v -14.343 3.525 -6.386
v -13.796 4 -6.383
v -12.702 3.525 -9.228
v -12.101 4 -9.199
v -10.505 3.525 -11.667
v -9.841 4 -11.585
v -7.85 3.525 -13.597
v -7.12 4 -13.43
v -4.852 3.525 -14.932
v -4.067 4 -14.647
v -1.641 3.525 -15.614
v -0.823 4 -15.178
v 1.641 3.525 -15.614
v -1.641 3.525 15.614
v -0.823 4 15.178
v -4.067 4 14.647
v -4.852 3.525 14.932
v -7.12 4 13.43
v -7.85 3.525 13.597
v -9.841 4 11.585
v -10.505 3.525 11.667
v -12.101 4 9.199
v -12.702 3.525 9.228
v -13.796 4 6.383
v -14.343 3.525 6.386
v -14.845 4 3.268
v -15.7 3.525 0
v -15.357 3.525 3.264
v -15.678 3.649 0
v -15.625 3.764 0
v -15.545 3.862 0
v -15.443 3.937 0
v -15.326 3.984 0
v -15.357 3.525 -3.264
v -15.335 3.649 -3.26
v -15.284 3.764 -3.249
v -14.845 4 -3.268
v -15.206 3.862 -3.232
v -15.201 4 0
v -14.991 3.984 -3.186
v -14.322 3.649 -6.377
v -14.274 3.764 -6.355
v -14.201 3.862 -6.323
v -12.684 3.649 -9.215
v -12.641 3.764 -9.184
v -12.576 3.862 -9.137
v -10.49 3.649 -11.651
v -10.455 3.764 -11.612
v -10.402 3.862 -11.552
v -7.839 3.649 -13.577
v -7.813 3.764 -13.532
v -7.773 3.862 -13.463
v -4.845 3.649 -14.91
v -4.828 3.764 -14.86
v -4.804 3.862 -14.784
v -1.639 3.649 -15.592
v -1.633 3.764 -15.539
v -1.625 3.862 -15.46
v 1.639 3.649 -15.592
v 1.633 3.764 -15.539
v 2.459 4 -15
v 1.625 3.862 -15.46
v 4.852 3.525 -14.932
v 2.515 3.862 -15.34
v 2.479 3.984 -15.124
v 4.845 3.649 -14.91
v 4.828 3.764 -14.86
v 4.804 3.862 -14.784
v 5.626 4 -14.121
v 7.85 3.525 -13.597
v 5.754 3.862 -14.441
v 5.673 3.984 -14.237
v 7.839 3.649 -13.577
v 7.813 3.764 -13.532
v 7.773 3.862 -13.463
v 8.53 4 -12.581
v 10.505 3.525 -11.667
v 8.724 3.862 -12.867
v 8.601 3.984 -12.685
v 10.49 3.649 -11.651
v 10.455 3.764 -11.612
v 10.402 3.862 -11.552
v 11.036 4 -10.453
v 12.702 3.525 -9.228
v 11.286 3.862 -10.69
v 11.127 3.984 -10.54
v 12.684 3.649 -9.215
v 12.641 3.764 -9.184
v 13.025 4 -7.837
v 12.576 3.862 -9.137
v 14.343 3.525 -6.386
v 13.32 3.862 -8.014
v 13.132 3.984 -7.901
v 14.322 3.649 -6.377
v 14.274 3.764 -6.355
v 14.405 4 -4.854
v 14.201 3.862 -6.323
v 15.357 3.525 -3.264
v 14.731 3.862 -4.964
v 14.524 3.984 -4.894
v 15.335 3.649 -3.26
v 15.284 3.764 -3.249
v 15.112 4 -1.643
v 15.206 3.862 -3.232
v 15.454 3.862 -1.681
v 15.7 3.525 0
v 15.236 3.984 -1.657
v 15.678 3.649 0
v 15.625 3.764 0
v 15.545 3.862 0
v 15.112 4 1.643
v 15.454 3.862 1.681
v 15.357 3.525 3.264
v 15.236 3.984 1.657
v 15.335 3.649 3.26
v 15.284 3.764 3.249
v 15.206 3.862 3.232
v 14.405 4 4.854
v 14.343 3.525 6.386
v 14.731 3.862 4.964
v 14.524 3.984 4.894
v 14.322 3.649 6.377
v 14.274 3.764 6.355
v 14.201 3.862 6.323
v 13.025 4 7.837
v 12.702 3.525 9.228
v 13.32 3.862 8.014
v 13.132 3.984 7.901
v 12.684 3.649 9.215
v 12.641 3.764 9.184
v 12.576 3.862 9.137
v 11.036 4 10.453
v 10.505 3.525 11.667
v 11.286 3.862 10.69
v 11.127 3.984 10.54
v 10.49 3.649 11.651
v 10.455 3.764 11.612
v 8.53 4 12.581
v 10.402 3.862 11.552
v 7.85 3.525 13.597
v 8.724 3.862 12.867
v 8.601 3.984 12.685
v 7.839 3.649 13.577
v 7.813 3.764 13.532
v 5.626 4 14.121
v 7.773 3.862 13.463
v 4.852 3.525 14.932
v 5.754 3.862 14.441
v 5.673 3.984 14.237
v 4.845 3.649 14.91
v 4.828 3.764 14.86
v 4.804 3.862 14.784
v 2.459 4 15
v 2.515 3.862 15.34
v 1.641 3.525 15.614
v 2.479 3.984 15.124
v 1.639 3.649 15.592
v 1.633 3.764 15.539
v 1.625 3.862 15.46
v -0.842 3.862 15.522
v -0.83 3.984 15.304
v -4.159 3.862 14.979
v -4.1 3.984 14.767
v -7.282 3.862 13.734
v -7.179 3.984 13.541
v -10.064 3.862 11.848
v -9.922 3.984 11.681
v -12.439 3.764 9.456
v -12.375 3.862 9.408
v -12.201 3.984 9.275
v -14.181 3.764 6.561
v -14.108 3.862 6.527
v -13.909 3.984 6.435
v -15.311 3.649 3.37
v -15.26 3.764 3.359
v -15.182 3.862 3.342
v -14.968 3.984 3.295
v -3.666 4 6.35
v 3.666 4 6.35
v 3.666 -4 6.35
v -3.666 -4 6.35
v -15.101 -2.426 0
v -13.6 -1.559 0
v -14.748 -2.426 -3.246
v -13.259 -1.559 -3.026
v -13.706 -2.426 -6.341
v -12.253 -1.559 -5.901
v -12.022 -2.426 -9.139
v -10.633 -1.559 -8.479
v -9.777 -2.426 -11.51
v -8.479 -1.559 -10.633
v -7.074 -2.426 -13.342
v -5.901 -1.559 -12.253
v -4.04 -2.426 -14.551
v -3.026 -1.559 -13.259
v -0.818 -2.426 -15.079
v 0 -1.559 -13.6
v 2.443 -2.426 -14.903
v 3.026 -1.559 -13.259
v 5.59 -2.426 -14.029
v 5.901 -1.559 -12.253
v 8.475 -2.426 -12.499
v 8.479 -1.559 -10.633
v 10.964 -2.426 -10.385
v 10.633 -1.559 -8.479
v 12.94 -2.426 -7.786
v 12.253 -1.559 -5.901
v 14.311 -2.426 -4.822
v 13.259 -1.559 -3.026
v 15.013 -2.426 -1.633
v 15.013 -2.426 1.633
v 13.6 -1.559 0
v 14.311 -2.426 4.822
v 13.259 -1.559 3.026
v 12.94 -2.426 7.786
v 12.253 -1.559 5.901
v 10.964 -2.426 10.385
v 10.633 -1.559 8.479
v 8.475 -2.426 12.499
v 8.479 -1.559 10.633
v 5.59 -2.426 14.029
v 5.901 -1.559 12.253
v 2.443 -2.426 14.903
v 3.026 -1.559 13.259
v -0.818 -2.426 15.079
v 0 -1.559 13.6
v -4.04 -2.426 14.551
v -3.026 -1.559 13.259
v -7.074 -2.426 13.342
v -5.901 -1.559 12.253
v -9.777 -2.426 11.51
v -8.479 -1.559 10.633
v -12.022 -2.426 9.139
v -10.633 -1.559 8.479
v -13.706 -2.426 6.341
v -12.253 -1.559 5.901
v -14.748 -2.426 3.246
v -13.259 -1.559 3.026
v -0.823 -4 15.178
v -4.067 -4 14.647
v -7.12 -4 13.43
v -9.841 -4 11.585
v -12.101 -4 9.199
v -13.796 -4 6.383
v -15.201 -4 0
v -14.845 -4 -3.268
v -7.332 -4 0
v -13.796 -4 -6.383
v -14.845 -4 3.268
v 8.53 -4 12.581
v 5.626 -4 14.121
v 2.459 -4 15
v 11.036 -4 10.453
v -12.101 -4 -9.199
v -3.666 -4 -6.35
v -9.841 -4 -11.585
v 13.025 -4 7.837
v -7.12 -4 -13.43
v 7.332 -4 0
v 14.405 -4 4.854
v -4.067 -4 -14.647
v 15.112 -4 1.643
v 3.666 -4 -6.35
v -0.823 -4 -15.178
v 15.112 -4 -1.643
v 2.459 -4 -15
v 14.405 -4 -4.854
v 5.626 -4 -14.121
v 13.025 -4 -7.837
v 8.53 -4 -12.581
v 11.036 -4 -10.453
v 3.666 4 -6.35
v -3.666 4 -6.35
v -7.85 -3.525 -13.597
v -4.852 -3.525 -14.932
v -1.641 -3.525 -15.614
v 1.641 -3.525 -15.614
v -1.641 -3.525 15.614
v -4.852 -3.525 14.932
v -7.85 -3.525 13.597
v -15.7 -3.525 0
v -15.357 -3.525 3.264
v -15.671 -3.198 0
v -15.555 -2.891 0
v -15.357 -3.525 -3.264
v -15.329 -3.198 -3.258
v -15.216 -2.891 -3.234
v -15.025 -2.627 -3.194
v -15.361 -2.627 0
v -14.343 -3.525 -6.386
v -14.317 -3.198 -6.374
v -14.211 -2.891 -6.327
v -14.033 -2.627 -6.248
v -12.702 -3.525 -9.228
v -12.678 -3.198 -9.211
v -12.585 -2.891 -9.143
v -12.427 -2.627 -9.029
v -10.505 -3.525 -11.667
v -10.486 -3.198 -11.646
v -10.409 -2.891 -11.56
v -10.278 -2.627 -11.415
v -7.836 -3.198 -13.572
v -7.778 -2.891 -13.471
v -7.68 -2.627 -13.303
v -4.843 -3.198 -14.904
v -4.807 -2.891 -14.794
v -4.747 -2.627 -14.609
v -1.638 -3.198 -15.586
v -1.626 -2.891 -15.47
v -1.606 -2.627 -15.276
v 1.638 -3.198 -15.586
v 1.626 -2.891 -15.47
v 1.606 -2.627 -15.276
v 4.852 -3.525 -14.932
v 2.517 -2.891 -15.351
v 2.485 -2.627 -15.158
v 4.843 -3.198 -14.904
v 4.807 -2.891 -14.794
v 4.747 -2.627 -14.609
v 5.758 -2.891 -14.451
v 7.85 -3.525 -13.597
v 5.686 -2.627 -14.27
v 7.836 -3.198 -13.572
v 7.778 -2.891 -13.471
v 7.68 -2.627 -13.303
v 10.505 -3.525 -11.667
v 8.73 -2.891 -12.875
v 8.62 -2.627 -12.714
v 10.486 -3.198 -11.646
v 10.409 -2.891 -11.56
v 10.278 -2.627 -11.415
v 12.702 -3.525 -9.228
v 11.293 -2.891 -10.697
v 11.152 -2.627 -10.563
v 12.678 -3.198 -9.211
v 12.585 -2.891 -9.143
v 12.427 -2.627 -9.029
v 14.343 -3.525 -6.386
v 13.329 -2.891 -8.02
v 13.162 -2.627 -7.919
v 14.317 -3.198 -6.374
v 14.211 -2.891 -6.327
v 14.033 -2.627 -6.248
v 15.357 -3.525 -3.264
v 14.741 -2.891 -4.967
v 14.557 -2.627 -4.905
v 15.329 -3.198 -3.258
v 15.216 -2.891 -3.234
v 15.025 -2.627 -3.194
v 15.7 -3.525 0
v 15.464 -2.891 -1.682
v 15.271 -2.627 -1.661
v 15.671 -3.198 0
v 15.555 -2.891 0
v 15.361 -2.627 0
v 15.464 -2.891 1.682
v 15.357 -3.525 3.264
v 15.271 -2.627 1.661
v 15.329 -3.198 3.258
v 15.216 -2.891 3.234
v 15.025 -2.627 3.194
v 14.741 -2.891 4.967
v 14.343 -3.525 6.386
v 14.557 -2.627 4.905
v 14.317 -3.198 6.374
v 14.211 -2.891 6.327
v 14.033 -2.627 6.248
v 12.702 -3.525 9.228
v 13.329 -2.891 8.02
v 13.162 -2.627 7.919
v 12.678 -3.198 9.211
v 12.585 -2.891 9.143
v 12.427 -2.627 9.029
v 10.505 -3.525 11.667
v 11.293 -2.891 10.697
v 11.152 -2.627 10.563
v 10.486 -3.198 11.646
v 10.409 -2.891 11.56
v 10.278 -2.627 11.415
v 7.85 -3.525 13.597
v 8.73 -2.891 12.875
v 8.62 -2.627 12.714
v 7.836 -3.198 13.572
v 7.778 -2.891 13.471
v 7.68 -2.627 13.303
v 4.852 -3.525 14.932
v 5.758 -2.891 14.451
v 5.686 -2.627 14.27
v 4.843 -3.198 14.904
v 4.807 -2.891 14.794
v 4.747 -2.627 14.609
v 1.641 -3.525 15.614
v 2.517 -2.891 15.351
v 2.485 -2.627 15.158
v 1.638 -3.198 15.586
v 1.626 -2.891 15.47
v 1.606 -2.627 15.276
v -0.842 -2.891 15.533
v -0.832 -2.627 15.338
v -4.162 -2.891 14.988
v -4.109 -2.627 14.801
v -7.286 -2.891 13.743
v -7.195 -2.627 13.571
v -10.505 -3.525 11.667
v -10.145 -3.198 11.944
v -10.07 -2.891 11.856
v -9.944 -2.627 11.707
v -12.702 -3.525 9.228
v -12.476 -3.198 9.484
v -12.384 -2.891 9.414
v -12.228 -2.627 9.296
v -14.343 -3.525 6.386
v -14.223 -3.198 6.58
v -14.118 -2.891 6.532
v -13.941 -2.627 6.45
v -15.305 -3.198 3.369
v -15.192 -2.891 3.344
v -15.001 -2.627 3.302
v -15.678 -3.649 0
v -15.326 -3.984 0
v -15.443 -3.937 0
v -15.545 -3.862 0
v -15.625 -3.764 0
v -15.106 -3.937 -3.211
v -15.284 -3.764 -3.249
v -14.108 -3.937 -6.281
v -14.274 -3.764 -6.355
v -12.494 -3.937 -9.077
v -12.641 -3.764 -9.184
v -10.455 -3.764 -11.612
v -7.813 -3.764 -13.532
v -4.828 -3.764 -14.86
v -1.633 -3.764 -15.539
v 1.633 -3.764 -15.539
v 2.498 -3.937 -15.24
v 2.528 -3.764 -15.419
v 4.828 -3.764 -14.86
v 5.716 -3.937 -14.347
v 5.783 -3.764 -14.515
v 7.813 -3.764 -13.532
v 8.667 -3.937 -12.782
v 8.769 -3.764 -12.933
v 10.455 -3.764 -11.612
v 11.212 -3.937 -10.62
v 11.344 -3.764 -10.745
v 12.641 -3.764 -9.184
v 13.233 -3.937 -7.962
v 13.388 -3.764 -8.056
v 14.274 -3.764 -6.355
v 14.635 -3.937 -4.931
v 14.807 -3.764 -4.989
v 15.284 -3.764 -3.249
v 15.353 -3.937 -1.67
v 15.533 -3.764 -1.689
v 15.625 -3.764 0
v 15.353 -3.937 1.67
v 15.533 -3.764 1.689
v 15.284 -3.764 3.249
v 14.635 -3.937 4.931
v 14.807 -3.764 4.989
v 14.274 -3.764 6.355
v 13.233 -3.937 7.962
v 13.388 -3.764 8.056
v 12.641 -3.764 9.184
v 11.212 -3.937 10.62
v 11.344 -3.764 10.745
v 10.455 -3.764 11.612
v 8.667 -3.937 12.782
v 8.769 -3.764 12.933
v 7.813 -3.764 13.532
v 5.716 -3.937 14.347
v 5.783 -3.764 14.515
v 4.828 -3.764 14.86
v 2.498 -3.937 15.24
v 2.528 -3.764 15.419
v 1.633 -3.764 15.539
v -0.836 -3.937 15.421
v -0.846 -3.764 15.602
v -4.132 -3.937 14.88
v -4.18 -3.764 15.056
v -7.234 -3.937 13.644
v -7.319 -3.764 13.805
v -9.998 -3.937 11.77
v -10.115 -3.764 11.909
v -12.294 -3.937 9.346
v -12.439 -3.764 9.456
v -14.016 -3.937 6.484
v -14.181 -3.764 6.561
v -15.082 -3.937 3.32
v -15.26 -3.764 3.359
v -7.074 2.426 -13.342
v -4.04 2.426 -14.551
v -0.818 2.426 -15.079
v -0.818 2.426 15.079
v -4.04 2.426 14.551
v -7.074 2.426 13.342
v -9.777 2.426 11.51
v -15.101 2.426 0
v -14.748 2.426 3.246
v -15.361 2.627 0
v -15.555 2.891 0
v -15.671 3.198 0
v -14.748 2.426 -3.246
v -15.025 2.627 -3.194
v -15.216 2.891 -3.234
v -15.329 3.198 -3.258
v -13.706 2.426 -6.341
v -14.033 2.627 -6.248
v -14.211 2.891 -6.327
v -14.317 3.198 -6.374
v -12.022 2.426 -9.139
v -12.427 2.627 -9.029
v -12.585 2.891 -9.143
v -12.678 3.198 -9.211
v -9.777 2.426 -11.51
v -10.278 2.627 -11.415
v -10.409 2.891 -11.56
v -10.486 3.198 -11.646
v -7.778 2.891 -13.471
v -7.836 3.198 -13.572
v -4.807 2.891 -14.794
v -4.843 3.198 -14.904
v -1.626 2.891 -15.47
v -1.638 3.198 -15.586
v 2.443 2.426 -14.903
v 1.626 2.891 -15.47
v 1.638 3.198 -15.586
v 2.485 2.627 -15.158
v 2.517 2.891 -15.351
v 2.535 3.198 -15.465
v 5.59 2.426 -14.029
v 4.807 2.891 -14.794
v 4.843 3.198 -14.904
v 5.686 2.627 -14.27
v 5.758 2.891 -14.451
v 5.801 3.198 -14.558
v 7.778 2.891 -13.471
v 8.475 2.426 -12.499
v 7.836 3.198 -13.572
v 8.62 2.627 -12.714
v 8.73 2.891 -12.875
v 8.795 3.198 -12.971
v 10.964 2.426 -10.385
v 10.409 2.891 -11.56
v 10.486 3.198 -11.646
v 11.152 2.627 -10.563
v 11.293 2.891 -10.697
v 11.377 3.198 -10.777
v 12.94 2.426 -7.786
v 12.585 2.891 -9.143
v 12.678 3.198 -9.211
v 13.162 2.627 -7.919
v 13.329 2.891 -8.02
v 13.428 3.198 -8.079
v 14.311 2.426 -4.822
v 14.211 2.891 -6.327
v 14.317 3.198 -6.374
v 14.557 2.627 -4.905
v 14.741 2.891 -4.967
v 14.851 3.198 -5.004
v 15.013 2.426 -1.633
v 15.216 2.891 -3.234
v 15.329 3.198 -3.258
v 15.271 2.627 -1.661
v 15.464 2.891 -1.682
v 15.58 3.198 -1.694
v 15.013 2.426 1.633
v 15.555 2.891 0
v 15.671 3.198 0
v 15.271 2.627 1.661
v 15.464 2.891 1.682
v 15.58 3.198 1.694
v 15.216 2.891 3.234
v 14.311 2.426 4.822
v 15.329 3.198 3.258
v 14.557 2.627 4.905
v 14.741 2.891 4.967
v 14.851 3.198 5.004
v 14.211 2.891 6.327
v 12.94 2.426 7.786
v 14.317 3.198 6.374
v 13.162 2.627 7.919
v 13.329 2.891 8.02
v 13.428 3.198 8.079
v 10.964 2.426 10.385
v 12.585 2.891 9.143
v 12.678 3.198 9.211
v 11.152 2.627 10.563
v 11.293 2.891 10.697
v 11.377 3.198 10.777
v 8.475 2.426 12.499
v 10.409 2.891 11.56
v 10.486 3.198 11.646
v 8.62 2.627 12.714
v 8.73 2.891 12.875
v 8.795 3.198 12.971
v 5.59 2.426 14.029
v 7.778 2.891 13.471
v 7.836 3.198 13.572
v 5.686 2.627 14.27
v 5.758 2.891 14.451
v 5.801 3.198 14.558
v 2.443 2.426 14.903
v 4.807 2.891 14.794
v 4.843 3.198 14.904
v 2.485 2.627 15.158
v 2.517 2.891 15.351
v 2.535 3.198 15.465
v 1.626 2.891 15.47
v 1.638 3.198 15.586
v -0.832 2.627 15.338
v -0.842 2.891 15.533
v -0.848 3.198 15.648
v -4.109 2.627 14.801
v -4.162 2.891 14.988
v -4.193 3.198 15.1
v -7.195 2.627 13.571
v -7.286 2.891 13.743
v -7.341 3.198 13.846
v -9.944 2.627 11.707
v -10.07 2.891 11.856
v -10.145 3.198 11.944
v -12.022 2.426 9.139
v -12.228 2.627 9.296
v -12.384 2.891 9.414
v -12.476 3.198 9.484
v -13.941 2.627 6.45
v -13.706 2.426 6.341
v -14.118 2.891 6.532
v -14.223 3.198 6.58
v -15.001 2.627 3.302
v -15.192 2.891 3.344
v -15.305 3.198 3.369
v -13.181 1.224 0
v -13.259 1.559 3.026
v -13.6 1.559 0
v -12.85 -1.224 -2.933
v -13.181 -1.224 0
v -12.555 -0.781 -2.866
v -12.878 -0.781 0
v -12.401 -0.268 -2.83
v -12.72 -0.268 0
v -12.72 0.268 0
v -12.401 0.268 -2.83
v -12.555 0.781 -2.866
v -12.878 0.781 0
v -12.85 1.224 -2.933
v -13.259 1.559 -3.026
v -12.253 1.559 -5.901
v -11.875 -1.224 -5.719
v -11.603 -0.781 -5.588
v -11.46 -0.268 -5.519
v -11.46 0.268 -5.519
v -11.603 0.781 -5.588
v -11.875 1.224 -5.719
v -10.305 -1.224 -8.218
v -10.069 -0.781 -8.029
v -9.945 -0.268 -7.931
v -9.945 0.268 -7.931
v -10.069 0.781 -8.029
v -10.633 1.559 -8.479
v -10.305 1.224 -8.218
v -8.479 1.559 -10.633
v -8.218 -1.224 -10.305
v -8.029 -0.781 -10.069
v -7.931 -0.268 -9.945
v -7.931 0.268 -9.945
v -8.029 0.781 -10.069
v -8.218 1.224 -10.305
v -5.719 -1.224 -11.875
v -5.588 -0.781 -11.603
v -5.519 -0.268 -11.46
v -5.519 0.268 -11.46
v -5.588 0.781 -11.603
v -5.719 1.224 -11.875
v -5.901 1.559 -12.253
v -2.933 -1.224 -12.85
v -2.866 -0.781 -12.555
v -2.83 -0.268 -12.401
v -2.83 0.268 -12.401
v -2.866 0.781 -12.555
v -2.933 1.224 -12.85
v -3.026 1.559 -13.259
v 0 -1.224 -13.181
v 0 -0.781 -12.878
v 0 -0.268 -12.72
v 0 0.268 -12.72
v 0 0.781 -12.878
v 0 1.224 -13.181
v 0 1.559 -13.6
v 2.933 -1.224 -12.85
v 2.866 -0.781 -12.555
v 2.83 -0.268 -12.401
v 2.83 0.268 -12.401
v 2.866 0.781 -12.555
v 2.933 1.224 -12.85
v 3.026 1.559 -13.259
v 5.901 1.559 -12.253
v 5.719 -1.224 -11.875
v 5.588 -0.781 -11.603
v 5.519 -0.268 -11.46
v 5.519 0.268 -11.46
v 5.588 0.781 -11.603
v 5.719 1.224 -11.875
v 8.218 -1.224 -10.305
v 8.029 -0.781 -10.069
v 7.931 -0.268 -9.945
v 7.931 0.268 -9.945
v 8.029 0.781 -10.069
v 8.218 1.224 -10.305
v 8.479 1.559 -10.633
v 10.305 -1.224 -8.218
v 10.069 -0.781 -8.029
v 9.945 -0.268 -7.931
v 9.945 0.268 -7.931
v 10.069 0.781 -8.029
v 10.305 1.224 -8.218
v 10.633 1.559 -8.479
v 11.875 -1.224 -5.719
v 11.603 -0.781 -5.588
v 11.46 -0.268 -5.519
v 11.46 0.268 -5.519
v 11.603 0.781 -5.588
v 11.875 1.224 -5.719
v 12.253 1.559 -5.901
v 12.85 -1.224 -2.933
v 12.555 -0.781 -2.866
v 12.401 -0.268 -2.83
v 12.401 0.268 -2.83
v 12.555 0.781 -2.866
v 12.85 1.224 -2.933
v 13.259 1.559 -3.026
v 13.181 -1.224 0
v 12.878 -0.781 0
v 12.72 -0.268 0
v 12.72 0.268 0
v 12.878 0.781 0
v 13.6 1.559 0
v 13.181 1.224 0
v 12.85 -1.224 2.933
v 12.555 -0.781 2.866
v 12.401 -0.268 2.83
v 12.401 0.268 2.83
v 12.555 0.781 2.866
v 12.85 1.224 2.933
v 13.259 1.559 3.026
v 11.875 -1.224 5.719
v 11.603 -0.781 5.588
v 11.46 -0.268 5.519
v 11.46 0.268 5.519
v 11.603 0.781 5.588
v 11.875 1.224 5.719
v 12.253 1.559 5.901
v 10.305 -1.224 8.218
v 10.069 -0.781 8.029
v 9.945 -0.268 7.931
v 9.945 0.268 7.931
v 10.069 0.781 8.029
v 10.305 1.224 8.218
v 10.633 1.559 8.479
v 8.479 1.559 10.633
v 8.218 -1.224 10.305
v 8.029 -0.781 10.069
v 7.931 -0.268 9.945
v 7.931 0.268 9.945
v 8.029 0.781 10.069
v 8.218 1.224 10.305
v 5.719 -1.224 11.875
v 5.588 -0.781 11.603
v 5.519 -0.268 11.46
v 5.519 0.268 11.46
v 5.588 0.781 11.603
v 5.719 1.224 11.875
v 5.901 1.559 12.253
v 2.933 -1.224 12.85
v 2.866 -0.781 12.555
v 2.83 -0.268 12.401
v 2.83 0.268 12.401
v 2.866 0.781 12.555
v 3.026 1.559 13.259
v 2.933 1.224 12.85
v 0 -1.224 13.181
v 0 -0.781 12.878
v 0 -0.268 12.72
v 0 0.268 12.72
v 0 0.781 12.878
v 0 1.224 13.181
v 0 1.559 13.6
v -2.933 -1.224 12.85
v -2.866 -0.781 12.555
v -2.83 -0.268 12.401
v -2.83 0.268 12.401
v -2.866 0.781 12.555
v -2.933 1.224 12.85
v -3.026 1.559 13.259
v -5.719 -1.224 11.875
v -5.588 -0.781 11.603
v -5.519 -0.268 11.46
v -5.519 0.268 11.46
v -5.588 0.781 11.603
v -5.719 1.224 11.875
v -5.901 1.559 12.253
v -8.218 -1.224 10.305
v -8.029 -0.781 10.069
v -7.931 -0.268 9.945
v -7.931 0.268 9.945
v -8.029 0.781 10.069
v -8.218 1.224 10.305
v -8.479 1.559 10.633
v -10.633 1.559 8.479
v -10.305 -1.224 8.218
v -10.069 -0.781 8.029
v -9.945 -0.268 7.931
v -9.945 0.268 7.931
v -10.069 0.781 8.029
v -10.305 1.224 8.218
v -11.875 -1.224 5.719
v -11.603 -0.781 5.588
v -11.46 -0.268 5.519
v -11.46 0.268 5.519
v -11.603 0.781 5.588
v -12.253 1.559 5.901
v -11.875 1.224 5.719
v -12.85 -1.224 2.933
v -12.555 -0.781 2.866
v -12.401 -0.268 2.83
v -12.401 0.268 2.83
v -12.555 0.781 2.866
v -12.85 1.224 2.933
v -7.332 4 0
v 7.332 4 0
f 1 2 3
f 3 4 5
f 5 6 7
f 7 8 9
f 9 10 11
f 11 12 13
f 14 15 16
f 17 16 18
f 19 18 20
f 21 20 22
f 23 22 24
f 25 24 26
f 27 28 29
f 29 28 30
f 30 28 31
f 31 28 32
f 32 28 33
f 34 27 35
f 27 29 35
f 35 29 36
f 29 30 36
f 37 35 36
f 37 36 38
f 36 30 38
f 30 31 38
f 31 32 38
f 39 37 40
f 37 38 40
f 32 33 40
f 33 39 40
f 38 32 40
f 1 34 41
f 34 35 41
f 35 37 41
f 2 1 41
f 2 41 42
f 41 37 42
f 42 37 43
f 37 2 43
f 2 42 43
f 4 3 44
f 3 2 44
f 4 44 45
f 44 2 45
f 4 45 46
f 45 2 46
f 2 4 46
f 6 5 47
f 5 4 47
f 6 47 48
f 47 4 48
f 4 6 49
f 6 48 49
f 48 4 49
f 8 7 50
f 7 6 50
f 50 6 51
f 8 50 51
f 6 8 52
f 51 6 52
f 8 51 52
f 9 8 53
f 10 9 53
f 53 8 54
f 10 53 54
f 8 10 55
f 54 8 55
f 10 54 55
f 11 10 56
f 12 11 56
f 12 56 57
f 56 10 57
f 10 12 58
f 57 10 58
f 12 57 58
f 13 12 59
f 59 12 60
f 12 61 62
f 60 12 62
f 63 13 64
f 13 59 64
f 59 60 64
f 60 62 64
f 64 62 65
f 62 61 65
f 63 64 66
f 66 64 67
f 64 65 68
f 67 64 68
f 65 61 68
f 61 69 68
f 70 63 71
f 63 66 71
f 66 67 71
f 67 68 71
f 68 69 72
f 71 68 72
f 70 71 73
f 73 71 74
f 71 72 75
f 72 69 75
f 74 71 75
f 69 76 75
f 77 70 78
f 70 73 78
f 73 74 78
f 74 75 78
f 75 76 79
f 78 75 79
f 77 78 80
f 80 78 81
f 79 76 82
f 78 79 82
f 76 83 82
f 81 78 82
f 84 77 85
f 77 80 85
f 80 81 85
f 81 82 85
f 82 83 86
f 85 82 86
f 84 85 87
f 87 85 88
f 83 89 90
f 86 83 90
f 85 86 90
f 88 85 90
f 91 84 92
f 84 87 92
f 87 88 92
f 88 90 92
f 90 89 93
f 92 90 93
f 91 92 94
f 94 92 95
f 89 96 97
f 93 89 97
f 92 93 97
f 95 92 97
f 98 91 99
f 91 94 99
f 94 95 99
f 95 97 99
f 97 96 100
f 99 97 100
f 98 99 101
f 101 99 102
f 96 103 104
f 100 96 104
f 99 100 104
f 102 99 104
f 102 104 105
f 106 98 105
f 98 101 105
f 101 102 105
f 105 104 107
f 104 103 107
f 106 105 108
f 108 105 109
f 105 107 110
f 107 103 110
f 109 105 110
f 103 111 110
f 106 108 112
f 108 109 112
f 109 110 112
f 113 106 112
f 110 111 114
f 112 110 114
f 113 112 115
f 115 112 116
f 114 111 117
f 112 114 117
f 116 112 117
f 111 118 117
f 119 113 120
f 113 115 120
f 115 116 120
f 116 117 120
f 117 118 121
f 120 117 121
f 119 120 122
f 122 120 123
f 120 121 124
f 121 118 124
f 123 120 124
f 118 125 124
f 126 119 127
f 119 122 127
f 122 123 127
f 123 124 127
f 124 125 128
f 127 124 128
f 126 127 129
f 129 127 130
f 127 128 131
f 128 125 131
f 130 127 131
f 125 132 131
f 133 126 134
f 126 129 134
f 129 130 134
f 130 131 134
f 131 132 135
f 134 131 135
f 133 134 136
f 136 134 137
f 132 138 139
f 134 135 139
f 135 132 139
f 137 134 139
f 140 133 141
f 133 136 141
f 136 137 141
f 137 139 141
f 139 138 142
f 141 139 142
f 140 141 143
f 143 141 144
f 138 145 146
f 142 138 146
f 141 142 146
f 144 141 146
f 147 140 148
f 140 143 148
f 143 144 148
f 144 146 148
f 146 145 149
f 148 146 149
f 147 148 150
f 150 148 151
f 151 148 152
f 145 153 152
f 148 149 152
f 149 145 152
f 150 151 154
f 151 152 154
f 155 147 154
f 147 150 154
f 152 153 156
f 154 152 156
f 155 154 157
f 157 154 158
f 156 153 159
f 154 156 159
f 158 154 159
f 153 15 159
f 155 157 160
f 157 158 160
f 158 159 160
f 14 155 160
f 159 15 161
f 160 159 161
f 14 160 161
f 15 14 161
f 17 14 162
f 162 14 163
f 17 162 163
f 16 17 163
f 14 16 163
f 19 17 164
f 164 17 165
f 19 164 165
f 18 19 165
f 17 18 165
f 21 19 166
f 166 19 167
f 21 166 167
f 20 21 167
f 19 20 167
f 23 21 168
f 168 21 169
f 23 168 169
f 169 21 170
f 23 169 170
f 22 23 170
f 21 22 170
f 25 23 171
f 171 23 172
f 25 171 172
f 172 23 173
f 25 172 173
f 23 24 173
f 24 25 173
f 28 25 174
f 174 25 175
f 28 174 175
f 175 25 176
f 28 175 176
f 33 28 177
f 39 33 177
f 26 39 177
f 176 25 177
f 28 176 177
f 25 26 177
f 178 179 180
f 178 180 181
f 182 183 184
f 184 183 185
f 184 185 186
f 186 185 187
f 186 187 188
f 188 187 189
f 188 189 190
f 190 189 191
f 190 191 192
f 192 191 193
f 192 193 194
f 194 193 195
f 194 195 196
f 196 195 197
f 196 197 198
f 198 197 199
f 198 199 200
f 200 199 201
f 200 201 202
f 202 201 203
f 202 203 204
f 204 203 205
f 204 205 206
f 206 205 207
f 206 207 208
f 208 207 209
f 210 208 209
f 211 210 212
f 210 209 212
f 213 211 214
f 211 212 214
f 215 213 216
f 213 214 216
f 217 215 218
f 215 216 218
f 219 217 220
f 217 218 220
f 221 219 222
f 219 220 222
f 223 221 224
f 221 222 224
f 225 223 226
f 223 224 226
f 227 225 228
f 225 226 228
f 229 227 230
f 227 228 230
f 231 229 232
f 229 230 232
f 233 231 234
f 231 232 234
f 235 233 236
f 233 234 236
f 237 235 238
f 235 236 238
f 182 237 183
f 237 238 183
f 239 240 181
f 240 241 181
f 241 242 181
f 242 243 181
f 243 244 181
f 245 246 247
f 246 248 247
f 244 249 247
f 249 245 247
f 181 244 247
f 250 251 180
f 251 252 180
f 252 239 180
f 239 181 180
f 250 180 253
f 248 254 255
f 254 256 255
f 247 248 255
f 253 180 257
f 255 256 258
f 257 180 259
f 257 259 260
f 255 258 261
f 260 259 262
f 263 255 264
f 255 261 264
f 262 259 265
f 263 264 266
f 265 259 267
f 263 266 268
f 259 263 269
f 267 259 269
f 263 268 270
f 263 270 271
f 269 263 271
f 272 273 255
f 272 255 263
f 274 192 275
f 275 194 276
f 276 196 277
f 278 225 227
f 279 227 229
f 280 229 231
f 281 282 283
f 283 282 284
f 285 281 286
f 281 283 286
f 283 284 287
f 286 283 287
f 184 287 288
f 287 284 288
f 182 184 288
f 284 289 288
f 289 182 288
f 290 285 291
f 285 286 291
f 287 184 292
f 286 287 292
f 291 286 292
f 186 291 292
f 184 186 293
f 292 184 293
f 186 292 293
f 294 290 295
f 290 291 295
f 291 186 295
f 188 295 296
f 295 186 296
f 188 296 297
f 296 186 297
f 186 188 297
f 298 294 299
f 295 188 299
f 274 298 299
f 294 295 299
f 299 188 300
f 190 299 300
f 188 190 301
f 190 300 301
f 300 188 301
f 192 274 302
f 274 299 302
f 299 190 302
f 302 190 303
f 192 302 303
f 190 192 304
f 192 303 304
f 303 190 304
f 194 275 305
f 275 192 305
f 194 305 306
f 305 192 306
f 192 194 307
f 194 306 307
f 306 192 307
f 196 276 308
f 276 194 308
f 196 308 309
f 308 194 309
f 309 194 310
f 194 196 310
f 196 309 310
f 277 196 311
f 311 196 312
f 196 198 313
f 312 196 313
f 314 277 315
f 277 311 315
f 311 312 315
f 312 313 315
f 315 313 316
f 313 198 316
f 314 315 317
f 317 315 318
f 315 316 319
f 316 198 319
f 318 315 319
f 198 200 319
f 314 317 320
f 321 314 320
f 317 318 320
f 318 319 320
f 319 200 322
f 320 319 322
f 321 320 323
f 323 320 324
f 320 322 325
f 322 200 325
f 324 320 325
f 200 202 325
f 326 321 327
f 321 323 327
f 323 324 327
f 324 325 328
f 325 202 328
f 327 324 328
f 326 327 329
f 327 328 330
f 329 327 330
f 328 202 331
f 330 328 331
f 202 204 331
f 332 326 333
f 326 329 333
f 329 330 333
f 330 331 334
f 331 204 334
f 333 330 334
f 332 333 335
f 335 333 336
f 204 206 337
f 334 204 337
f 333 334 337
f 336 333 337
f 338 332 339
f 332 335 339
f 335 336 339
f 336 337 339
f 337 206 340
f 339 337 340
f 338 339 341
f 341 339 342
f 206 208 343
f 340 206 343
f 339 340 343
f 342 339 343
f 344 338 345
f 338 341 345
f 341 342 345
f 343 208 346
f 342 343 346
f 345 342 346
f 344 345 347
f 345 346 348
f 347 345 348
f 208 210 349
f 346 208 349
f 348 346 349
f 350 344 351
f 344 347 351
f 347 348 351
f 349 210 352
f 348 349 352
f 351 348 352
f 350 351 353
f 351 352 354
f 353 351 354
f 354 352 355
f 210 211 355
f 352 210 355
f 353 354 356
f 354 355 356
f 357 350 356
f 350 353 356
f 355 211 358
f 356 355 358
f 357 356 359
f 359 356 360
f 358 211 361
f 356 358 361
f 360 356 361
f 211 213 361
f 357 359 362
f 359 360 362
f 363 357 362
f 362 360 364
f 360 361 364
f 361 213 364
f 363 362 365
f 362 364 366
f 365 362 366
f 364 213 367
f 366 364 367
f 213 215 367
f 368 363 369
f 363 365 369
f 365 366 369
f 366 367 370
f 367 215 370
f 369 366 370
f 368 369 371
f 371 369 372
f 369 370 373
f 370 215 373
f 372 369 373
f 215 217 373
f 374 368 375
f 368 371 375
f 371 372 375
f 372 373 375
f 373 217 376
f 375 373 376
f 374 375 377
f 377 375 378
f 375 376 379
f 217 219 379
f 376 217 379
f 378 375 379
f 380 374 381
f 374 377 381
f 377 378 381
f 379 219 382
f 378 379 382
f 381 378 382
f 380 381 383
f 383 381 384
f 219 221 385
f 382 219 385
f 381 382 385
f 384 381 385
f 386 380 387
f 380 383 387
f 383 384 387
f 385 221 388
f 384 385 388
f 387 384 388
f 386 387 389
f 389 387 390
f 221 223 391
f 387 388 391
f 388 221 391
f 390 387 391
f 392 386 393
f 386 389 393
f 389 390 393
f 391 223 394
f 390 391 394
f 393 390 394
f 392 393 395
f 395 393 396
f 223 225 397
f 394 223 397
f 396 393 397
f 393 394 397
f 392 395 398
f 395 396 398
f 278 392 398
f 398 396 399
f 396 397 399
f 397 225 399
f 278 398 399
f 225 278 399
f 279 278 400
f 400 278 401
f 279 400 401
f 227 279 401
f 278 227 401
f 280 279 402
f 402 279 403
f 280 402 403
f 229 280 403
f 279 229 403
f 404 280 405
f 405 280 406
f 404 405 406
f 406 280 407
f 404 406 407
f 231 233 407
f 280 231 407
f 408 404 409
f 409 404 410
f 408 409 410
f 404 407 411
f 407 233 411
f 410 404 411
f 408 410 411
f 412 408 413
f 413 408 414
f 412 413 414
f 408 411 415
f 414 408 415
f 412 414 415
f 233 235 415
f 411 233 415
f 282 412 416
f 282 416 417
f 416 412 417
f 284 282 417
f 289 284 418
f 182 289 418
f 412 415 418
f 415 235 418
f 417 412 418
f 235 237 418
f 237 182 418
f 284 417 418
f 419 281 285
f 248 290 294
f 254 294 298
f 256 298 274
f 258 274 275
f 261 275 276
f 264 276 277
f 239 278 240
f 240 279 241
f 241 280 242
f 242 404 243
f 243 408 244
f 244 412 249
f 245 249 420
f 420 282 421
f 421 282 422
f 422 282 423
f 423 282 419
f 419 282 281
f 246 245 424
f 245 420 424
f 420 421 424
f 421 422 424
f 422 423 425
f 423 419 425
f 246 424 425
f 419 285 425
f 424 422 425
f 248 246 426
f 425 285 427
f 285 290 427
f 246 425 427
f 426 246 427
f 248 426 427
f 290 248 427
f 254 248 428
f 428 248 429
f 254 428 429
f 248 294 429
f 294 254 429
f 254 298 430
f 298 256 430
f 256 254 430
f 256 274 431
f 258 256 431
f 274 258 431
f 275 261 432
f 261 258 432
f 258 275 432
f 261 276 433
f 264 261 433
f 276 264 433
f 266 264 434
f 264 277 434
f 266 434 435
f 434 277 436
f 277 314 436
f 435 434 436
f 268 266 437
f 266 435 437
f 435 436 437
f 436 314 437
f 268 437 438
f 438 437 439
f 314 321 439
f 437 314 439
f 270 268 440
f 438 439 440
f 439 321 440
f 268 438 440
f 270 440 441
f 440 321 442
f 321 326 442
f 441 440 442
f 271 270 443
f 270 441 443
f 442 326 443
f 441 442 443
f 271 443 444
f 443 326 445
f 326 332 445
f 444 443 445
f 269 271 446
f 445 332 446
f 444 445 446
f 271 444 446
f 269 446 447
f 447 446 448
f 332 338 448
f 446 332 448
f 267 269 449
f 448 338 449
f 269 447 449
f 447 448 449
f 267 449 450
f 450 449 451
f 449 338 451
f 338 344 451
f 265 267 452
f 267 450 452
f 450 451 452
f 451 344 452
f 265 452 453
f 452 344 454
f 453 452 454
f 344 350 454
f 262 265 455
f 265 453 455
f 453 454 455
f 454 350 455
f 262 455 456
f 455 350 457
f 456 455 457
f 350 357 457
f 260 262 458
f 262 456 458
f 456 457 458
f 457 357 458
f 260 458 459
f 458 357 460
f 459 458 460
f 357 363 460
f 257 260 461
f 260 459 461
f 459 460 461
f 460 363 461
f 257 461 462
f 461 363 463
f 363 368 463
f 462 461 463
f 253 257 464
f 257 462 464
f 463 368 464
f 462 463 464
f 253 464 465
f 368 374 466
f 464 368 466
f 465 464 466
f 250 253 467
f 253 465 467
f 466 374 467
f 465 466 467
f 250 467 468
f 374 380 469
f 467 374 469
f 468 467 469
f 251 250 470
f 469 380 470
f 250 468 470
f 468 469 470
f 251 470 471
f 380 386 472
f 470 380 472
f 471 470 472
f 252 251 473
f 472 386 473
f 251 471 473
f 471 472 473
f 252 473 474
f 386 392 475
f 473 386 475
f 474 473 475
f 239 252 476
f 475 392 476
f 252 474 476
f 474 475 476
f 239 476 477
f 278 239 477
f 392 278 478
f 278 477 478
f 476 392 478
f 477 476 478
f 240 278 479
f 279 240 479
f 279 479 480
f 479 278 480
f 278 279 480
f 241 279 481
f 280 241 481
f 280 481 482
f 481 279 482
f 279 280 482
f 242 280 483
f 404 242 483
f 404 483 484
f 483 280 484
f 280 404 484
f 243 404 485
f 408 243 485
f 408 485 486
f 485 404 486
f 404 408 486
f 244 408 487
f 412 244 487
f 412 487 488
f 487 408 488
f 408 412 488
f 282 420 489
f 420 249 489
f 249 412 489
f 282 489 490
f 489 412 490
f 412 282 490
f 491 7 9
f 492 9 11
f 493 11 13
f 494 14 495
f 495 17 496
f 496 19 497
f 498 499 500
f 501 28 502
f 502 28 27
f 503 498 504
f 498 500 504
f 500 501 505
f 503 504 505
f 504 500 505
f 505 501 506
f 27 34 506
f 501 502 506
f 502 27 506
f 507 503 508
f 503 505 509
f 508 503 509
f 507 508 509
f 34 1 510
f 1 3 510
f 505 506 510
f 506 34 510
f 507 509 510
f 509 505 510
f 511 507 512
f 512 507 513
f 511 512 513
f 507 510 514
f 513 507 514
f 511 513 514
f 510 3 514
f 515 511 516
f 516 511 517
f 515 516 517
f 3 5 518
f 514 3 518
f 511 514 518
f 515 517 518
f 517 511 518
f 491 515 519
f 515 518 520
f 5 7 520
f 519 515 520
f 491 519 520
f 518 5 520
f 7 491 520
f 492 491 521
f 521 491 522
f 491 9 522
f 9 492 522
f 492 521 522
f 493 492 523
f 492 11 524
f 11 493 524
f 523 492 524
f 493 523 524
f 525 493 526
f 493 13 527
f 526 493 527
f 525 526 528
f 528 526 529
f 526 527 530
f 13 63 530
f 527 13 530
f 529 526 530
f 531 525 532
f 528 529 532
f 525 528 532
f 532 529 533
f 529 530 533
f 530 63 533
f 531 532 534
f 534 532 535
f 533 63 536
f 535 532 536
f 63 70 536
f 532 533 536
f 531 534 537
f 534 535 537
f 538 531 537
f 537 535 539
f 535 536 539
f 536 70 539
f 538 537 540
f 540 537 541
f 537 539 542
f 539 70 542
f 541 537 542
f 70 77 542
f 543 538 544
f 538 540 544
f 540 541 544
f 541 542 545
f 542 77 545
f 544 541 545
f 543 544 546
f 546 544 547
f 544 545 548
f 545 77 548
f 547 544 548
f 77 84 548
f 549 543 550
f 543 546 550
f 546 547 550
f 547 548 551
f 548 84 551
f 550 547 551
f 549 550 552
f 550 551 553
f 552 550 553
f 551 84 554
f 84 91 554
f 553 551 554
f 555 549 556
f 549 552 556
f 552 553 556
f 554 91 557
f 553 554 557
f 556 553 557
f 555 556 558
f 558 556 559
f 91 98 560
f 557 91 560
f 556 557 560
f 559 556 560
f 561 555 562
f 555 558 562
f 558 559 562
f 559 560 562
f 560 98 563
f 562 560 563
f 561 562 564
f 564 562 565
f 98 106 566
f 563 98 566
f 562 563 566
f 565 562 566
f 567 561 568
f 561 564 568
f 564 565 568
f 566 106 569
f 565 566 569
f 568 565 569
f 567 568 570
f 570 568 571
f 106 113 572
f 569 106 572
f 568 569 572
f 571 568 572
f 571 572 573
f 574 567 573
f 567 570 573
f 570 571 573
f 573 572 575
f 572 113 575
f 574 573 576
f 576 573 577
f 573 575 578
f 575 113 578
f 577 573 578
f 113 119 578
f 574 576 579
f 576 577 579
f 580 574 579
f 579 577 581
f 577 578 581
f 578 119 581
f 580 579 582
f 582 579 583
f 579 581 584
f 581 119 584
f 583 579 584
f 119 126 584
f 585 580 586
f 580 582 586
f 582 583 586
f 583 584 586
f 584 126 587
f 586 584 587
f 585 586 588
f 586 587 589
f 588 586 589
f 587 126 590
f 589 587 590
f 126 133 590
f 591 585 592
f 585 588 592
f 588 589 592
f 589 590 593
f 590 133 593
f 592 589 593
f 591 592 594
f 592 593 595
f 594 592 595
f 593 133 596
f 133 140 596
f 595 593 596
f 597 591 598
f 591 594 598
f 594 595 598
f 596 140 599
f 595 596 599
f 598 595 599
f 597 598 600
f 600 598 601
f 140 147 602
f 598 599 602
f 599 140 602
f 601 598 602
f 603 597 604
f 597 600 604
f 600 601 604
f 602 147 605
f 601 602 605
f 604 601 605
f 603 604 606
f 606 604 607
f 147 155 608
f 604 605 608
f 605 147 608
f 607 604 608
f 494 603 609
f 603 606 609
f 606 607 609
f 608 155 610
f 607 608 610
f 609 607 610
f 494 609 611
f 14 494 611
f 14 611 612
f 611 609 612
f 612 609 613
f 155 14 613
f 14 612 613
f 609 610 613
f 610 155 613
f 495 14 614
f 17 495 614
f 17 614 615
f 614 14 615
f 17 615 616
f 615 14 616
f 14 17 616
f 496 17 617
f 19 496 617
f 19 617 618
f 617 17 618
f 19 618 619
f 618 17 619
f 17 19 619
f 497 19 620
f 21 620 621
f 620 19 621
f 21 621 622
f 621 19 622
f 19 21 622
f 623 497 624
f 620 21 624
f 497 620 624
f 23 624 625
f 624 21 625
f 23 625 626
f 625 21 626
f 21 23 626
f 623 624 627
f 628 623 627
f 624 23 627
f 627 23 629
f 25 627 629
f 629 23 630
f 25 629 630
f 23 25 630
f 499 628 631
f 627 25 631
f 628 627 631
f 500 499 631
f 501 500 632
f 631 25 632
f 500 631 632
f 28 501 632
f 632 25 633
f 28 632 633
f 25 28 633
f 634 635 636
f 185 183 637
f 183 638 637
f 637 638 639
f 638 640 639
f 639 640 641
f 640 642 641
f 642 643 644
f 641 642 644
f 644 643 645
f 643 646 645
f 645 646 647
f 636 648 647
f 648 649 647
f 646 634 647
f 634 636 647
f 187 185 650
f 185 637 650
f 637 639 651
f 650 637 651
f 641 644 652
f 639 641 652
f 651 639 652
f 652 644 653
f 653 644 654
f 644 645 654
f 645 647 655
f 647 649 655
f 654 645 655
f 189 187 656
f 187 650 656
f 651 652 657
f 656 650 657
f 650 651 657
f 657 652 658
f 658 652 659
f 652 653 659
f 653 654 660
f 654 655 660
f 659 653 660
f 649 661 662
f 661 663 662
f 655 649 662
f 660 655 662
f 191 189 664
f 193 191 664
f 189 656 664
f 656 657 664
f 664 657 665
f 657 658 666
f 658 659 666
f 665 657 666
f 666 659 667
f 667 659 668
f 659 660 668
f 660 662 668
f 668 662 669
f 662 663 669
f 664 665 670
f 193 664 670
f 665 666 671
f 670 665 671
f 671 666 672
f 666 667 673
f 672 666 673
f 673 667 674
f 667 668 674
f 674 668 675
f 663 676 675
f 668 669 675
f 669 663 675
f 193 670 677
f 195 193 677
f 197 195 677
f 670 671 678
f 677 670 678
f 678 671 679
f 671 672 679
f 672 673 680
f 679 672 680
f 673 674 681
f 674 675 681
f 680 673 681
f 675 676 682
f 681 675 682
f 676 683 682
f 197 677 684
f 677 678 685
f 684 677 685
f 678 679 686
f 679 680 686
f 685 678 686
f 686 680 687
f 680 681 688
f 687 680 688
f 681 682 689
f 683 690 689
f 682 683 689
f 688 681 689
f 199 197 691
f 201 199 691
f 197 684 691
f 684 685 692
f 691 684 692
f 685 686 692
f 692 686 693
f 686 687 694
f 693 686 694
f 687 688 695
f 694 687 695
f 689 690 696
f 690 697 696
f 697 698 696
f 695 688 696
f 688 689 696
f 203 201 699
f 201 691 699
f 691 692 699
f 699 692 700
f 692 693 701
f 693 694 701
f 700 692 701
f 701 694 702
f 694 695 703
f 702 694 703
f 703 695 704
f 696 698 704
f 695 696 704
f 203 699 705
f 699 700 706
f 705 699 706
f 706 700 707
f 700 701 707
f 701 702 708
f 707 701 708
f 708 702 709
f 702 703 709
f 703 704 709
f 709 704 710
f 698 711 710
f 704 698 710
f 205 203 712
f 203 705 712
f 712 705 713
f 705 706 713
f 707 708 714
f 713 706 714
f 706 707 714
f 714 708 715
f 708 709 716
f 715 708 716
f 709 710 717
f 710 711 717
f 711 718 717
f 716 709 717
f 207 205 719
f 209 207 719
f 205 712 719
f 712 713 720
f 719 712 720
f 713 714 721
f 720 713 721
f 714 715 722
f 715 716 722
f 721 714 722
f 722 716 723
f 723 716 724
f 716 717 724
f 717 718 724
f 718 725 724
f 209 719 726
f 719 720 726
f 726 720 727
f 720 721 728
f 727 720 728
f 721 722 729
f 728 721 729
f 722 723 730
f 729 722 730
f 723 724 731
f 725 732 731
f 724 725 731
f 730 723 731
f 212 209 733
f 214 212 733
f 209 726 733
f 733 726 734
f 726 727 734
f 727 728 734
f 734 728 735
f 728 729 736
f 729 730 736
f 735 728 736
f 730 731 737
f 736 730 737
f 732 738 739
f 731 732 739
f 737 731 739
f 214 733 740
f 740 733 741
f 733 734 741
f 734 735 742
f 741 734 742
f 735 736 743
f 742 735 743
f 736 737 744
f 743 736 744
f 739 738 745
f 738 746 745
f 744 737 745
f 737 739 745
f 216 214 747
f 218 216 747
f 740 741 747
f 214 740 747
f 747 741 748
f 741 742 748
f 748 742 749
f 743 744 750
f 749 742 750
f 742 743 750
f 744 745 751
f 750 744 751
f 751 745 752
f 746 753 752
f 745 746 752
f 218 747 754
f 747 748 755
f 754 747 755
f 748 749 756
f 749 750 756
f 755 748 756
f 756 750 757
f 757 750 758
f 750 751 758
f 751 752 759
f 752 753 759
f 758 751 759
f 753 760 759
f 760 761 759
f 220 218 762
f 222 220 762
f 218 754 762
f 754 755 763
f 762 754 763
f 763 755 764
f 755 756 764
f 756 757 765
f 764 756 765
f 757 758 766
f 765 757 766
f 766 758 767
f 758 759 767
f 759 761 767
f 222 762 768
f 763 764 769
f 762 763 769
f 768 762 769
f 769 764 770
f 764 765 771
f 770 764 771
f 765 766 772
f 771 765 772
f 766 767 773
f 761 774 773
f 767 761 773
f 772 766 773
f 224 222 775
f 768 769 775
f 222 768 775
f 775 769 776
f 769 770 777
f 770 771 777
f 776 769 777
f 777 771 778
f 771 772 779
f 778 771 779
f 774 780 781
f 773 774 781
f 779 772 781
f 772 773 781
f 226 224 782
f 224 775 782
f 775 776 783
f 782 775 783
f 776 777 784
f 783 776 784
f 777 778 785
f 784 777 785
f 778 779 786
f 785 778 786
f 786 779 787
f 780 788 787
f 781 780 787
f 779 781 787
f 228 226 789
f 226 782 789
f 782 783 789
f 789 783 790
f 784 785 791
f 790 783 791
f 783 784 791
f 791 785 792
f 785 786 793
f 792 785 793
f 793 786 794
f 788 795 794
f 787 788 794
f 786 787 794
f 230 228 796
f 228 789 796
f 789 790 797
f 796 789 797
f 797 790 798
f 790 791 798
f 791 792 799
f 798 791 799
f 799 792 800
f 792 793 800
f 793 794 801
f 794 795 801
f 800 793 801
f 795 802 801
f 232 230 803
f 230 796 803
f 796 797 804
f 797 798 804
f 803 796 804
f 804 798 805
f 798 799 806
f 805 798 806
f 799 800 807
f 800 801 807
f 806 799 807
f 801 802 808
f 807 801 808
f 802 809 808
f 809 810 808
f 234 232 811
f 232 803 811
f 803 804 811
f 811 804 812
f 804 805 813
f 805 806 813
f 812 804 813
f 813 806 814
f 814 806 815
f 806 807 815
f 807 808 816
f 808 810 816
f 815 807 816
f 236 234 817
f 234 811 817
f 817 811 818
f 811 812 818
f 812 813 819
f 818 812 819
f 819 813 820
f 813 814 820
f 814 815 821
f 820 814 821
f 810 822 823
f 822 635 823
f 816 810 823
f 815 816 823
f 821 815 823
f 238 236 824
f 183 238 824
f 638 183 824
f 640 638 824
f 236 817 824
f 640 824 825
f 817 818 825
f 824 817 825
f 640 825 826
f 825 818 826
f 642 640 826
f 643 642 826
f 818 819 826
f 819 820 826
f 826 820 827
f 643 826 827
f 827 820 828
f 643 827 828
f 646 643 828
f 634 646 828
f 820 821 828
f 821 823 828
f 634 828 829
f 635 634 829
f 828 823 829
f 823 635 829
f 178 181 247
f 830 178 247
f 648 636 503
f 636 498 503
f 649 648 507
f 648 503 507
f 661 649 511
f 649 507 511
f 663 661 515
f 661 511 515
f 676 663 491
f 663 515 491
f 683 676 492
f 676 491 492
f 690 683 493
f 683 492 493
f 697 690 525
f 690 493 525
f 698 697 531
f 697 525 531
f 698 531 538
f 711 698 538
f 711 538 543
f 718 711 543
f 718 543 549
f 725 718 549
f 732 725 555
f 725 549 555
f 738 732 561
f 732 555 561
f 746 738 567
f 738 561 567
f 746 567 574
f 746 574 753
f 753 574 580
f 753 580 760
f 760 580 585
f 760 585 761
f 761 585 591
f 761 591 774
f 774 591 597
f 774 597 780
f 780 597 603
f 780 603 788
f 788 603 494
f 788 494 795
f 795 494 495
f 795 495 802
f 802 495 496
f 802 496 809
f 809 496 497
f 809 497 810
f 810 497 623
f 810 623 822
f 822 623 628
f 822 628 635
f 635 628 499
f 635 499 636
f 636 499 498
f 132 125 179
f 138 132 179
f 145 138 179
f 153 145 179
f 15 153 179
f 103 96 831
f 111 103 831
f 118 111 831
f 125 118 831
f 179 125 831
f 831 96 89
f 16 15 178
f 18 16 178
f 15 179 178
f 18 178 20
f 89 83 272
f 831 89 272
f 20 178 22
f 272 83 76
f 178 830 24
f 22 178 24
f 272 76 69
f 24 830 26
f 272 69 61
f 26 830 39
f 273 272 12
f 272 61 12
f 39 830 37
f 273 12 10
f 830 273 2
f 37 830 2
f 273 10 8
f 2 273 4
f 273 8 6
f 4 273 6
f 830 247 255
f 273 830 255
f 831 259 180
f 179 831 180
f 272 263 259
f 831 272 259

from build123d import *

# Parameters (mm, degrees)
CUT_EXTRUDE2_DEPTH = 9.0000094


with BuildPart() as part:
    # Sketch1 → Revolve1 (revolve)
    with BuildSketch(Plane(origin=(0, 0, 0), x_dir=(0, 1, 0), z_dir=(0, 0, 1))):
        with BuildLine():
            Line((4.0000047, 0), (-4.0000047, 0))
            Line((-4.0000047, 0), (-4.0000047, 15.200621907))
            ThreePointArc((-4.0000047, 15.200621907), (-3.862299847, 15.545211447), (-3.525035946, 15.699994))
            ThreePointArc((-3.525035946, 15.699994), (-2.891173009, 15.55542644), (-2.425734949, 15.101499778))
            Line((-2.425734949, 15.101499778), (-1.558842609, 13.5999982))
            ThreePointArc((-1.558842609, 13.5999982), (0, 12.7), (1.558842609, 13.5999982))
            Line((1.558842609, 13.5999982), (2.425734949, 15.101499778))
            ThreePointArc((2.425734949, 15.101499778), (2.891173009, 15.55542644), (3.525035946, 15.699994))
            ThreePointArc((3.525035946, 15.699994), (3.862299847, 15.545211447), (4.0000047, 15.200621907))
            Line((4.0000047, 15.200621907), (4.0000047, 0))
        make_face()
    revolve(axis=Axis((0, 4.0000047, 0), (0, -1, 0)))

    # Sketch2 → Cut-Extrude2 (cut, through all)
    with BuildSketch(Plane.XZ.offset(4.0000047)):
        Polygon((7.332348419, 0), (3.666174209, 6.35), (-3.666174209, 6.35), (-7.332348419, 0), (-3.666174209, -6.35), (3.666174209, -6.35), align=None)
    extrude(amount=-CUT_EXTRUDE2_DEPTH, mode=Mode.SUBTRACT)


solid = part.part
